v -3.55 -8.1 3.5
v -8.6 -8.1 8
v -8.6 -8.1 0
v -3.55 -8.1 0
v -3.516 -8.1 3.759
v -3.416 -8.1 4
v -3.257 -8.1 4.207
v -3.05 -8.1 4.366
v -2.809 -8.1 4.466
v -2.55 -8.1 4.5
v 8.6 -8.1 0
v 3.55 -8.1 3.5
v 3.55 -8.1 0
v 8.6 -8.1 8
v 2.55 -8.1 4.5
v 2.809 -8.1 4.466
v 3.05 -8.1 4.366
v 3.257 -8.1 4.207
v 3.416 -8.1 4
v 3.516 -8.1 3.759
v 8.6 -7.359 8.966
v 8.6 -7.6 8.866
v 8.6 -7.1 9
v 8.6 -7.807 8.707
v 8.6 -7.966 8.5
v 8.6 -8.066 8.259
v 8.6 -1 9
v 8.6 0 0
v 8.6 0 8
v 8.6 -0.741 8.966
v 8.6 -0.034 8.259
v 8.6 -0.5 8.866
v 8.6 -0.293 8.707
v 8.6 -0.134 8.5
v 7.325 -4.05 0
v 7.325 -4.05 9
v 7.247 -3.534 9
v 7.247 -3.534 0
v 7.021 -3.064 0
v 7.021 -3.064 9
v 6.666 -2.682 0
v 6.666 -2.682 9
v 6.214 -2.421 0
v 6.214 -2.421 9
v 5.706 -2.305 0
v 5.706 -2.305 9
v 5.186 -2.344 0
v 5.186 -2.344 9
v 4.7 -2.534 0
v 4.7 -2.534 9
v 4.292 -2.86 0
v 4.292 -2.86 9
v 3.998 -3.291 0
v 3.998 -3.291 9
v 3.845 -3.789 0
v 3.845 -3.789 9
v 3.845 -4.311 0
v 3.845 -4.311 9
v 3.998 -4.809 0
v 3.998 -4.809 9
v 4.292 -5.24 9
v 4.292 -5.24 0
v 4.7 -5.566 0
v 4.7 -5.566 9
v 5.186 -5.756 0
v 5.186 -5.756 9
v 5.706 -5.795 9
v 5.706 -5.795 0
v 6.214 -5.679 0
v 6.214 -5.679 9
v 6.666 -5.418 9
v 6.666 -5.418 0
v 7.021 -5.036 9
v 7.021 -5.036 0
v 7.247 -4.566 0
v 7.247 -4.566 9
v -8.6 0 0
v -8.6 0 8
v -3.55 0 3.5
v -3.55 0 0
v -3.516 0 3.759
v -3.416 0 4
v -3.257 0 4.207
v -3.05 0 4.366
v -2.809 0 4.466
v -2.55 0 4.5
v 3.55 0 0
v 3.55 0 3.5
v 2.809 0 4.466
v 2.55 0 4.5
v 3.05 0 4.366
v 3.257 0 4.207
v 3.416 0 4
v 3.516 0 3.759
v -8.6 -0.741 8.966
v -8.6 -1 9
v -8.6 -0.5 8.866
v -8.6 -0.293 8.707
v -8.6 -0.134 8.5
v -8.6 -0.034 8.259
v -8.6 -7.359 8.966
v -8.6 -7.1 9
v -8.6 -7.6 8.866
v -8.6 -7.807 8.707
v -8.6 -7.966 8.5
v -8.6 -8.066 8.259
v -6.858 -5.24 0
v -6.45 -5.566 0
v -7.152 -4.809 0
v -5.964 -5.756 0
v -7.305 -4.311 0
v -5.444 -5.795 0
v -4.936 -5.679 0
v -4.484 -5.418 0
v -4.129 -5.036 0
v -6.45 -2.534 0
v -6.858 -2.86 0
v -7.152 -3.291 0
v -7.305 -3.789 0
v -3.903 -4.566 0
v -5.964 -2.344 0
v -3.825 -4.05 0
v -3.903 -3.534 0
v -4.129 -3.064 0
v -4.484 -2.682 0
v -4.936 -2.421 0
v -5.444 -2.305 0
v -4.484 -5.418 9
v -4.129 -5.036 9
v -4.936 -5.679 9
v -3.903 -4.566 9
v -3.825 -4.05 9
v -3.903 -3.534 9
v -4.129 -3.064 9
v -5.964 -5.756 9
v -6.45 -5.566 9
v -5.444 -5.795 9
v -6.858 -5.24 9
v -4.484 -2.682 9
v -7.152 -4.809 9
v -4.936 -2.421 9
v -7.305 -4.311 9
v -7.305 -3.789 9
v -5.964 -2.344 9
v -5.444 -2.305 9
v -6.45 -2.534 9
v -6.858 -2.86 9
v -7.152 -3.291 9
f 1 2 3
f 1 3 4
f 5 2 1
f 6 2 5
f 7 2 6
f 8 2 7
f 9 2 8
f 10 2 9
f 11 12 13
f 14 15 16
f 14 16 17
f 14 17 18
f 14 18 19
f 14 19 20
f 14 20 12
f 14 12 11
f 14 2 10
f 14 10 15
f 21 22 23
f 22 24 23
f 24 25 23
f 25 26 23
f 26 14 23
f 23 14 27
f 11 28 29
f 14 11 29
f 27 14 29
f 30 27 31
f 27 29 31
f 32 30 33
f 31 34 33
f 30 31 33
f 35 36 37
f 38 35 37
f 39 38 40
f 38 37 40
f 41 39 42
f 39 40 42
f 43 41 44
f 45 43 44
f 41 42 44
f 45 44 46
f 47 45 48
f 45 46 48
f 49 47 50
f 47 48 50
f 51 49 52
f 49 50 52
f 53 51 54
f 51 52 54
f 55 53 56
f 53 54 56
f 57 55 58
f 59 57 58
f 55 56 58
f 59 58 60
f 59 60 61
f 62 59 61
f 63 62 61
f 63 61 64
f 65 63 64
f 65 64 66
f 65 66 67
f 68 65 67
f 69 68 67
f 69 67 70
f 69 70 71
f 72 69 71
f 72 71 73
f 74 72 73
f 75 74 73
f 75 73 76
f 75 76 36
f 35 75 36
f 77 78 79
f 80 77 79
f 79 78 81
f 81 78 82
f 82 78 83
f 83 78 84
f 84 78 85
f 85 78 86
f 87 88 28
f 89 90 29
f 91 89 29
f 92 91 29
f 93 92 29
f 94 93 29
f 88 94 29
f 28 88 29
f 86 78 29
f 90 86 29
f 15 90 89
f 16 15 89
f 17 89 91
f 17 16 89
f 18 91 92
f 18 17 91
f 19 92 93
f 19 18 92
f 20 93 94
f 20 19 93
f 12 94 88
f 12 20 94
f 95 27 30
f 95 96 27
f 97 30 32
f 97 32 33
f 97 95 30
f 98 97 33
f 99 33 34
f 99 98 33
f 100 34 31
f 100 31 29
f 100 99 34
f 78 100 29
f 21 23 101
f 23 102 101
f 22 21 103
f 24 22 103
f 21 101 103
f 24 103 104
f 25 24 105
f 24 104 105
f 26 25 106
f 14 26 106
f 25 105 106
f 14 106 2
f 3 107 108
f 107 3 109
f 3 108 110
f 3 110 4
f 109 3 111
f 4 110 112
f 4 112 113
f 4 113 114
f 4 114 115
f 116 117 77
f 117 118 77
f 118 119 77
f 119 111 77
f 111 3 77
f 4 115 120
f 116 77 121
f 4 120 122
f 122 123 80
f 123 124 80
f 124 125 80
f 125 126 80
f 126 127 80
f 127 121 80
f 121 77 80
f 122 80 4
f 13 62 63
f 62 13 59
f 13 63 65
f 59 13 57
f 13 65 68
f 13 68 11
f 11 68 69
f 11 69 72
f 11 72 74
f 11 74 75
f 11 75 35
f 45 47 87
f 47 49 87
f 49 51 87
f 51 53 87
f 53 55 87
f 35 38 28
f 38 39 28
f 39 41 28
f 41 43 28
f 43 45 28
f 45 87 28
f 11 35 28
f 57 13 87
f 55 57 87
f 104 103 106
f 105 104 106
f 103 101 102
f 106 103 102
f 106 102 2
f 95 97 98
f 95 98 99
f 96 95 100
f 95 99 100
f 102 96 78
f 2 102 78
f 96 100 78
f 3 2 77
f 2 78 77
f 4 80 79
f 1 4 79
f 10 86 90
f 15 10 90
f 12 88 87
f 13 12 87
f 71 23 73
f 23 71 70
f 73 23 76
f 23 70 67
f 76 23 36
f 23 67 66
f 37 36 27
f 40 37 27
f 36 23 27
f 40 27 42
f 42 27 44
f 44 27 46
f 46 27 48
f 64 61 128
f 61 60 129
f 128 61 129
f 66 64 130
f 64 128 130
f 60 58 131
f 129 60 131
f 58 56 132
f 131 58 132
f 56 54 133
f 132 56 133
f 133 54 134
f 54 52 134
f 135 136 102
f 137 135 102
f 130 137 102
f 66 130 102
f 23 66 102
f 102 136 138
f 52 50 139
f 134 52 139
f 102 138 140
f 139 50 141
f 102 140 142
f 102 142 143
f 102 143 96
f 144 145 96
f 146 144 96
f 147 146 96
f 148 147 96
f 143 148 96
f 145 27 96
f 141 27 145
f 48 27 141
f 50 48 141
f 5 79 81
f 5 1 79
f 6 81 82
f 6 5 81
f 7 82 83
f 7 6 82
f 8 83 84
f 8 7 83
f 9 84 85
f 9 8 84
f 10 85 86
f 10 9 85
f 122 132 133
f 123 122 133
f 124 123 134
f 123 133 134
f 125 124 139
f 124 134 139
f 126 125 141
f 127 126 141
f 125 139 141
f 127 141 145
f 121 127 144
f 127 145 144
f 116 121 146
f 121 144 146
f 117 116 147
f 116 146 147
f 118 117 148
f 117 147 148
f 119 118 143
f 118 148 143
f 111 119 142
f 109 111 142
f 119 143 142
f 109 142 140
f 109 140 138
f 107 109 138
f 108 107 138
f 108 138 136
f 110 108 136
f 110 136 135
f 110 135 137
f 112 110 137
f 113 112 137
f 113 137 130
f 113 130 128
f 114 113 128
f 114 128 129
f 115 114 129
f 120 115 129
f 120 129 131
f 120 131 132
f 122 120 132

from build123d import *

# Parameters (mm, degrees)
F1_DEPTH = 8.1
F2_R     = 1.75
F3_DEPTH = 9.001
F4_R     = 1


with BuildPart() as f1:
    # F0 (on Front) → F1 (new body)
    with BuildSketch(Plane.XZ):
        Polygon((-8.6, 9), (-8.6, 0), (-3.55, 0), (-3.55, 4.5), (3.55, 4.5), (3.55, 0), (8.6, 0), (8.6, 9), align=None)
    extrude(amount=F1_DEPTH)

    # F2 (on face) → F3 (cut, through all)
    with BuildSketch(Plane.XY.offset(9)):
        with Locations((-5.575, -4.05)):
            Circle(F2_R)
        with Locations((5.575, -4.05)):
            Circle(F2_R)
    extrude(amount=-F3_DEPTH, mode=Mode.SUBTRACT)

    # F4
    f4_edges = [f1.edges().sort_by_distance(p)[0] for p in [
        (0, -8.1, 9),
        (0, 0, 9),
        (-3.55, -4.05, 4.5),
        (3.55, -4.05, 4.5),
    ]]
    fillet(f4_edges, radius=F4_R)


solid = f1.part
